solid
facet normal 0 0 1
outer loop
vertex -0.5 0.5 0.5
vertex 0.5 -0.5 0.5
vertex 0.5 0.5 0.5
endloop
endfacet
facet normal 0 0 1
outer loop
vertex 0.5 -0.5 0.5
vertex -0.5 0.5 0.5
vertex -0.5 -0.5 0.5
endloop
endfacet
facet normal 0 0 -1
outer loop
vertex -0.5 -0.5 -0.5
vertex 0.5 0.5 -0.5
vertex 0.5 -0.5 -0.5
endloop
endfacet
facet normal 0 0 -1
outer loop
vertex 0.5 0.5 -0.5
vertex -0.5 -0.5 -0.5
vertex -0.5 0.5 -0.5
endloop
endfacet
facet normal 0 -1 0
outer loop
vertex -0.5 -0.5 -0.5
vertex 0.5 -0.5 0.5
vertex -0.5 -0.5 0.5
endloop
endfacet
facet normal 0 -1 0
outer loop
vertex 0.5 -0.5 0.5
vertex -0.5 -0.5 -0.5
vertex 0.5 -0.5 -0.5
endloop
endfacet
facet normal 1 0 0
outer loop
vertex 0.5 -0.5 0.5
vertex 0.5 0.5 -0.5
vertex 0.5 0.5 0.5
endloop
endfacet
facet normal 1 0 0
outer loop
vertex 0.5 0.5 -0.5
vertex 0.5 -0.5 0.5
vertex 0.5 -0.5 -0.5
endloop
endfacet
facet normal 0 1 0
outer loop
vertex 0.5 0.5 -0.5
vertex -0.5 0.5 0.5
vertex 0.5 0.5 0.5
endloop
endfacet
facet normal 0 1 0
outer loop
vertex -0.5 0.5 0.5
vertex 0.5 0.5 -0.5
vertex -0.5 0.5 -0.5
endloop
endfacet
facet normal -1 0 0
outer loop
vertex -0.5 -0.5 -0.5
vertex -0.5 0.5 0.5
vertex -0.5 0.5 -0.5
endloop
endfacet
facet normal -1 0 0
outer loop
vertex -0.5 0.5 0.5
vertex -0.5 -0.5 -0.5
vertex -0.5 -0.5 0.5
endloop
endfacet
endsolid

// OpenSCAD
distance_between_pulleys = 100;
margin_around_holes = 5;
hole_diameter = 5;
pulley_diameter = 1;
thickness = 5;
n_tuning_holes = 3;

cube(size =[2*margin_around_holes + hole_diameter, 2*margin_around_holes + hole_diameter + 100], center = true);
//cube(size=[distance_between_pulleys+2*margin_around_holes+hole_diameter, 2*margin_around_holes + hole_diameter, thickness], center = true);
